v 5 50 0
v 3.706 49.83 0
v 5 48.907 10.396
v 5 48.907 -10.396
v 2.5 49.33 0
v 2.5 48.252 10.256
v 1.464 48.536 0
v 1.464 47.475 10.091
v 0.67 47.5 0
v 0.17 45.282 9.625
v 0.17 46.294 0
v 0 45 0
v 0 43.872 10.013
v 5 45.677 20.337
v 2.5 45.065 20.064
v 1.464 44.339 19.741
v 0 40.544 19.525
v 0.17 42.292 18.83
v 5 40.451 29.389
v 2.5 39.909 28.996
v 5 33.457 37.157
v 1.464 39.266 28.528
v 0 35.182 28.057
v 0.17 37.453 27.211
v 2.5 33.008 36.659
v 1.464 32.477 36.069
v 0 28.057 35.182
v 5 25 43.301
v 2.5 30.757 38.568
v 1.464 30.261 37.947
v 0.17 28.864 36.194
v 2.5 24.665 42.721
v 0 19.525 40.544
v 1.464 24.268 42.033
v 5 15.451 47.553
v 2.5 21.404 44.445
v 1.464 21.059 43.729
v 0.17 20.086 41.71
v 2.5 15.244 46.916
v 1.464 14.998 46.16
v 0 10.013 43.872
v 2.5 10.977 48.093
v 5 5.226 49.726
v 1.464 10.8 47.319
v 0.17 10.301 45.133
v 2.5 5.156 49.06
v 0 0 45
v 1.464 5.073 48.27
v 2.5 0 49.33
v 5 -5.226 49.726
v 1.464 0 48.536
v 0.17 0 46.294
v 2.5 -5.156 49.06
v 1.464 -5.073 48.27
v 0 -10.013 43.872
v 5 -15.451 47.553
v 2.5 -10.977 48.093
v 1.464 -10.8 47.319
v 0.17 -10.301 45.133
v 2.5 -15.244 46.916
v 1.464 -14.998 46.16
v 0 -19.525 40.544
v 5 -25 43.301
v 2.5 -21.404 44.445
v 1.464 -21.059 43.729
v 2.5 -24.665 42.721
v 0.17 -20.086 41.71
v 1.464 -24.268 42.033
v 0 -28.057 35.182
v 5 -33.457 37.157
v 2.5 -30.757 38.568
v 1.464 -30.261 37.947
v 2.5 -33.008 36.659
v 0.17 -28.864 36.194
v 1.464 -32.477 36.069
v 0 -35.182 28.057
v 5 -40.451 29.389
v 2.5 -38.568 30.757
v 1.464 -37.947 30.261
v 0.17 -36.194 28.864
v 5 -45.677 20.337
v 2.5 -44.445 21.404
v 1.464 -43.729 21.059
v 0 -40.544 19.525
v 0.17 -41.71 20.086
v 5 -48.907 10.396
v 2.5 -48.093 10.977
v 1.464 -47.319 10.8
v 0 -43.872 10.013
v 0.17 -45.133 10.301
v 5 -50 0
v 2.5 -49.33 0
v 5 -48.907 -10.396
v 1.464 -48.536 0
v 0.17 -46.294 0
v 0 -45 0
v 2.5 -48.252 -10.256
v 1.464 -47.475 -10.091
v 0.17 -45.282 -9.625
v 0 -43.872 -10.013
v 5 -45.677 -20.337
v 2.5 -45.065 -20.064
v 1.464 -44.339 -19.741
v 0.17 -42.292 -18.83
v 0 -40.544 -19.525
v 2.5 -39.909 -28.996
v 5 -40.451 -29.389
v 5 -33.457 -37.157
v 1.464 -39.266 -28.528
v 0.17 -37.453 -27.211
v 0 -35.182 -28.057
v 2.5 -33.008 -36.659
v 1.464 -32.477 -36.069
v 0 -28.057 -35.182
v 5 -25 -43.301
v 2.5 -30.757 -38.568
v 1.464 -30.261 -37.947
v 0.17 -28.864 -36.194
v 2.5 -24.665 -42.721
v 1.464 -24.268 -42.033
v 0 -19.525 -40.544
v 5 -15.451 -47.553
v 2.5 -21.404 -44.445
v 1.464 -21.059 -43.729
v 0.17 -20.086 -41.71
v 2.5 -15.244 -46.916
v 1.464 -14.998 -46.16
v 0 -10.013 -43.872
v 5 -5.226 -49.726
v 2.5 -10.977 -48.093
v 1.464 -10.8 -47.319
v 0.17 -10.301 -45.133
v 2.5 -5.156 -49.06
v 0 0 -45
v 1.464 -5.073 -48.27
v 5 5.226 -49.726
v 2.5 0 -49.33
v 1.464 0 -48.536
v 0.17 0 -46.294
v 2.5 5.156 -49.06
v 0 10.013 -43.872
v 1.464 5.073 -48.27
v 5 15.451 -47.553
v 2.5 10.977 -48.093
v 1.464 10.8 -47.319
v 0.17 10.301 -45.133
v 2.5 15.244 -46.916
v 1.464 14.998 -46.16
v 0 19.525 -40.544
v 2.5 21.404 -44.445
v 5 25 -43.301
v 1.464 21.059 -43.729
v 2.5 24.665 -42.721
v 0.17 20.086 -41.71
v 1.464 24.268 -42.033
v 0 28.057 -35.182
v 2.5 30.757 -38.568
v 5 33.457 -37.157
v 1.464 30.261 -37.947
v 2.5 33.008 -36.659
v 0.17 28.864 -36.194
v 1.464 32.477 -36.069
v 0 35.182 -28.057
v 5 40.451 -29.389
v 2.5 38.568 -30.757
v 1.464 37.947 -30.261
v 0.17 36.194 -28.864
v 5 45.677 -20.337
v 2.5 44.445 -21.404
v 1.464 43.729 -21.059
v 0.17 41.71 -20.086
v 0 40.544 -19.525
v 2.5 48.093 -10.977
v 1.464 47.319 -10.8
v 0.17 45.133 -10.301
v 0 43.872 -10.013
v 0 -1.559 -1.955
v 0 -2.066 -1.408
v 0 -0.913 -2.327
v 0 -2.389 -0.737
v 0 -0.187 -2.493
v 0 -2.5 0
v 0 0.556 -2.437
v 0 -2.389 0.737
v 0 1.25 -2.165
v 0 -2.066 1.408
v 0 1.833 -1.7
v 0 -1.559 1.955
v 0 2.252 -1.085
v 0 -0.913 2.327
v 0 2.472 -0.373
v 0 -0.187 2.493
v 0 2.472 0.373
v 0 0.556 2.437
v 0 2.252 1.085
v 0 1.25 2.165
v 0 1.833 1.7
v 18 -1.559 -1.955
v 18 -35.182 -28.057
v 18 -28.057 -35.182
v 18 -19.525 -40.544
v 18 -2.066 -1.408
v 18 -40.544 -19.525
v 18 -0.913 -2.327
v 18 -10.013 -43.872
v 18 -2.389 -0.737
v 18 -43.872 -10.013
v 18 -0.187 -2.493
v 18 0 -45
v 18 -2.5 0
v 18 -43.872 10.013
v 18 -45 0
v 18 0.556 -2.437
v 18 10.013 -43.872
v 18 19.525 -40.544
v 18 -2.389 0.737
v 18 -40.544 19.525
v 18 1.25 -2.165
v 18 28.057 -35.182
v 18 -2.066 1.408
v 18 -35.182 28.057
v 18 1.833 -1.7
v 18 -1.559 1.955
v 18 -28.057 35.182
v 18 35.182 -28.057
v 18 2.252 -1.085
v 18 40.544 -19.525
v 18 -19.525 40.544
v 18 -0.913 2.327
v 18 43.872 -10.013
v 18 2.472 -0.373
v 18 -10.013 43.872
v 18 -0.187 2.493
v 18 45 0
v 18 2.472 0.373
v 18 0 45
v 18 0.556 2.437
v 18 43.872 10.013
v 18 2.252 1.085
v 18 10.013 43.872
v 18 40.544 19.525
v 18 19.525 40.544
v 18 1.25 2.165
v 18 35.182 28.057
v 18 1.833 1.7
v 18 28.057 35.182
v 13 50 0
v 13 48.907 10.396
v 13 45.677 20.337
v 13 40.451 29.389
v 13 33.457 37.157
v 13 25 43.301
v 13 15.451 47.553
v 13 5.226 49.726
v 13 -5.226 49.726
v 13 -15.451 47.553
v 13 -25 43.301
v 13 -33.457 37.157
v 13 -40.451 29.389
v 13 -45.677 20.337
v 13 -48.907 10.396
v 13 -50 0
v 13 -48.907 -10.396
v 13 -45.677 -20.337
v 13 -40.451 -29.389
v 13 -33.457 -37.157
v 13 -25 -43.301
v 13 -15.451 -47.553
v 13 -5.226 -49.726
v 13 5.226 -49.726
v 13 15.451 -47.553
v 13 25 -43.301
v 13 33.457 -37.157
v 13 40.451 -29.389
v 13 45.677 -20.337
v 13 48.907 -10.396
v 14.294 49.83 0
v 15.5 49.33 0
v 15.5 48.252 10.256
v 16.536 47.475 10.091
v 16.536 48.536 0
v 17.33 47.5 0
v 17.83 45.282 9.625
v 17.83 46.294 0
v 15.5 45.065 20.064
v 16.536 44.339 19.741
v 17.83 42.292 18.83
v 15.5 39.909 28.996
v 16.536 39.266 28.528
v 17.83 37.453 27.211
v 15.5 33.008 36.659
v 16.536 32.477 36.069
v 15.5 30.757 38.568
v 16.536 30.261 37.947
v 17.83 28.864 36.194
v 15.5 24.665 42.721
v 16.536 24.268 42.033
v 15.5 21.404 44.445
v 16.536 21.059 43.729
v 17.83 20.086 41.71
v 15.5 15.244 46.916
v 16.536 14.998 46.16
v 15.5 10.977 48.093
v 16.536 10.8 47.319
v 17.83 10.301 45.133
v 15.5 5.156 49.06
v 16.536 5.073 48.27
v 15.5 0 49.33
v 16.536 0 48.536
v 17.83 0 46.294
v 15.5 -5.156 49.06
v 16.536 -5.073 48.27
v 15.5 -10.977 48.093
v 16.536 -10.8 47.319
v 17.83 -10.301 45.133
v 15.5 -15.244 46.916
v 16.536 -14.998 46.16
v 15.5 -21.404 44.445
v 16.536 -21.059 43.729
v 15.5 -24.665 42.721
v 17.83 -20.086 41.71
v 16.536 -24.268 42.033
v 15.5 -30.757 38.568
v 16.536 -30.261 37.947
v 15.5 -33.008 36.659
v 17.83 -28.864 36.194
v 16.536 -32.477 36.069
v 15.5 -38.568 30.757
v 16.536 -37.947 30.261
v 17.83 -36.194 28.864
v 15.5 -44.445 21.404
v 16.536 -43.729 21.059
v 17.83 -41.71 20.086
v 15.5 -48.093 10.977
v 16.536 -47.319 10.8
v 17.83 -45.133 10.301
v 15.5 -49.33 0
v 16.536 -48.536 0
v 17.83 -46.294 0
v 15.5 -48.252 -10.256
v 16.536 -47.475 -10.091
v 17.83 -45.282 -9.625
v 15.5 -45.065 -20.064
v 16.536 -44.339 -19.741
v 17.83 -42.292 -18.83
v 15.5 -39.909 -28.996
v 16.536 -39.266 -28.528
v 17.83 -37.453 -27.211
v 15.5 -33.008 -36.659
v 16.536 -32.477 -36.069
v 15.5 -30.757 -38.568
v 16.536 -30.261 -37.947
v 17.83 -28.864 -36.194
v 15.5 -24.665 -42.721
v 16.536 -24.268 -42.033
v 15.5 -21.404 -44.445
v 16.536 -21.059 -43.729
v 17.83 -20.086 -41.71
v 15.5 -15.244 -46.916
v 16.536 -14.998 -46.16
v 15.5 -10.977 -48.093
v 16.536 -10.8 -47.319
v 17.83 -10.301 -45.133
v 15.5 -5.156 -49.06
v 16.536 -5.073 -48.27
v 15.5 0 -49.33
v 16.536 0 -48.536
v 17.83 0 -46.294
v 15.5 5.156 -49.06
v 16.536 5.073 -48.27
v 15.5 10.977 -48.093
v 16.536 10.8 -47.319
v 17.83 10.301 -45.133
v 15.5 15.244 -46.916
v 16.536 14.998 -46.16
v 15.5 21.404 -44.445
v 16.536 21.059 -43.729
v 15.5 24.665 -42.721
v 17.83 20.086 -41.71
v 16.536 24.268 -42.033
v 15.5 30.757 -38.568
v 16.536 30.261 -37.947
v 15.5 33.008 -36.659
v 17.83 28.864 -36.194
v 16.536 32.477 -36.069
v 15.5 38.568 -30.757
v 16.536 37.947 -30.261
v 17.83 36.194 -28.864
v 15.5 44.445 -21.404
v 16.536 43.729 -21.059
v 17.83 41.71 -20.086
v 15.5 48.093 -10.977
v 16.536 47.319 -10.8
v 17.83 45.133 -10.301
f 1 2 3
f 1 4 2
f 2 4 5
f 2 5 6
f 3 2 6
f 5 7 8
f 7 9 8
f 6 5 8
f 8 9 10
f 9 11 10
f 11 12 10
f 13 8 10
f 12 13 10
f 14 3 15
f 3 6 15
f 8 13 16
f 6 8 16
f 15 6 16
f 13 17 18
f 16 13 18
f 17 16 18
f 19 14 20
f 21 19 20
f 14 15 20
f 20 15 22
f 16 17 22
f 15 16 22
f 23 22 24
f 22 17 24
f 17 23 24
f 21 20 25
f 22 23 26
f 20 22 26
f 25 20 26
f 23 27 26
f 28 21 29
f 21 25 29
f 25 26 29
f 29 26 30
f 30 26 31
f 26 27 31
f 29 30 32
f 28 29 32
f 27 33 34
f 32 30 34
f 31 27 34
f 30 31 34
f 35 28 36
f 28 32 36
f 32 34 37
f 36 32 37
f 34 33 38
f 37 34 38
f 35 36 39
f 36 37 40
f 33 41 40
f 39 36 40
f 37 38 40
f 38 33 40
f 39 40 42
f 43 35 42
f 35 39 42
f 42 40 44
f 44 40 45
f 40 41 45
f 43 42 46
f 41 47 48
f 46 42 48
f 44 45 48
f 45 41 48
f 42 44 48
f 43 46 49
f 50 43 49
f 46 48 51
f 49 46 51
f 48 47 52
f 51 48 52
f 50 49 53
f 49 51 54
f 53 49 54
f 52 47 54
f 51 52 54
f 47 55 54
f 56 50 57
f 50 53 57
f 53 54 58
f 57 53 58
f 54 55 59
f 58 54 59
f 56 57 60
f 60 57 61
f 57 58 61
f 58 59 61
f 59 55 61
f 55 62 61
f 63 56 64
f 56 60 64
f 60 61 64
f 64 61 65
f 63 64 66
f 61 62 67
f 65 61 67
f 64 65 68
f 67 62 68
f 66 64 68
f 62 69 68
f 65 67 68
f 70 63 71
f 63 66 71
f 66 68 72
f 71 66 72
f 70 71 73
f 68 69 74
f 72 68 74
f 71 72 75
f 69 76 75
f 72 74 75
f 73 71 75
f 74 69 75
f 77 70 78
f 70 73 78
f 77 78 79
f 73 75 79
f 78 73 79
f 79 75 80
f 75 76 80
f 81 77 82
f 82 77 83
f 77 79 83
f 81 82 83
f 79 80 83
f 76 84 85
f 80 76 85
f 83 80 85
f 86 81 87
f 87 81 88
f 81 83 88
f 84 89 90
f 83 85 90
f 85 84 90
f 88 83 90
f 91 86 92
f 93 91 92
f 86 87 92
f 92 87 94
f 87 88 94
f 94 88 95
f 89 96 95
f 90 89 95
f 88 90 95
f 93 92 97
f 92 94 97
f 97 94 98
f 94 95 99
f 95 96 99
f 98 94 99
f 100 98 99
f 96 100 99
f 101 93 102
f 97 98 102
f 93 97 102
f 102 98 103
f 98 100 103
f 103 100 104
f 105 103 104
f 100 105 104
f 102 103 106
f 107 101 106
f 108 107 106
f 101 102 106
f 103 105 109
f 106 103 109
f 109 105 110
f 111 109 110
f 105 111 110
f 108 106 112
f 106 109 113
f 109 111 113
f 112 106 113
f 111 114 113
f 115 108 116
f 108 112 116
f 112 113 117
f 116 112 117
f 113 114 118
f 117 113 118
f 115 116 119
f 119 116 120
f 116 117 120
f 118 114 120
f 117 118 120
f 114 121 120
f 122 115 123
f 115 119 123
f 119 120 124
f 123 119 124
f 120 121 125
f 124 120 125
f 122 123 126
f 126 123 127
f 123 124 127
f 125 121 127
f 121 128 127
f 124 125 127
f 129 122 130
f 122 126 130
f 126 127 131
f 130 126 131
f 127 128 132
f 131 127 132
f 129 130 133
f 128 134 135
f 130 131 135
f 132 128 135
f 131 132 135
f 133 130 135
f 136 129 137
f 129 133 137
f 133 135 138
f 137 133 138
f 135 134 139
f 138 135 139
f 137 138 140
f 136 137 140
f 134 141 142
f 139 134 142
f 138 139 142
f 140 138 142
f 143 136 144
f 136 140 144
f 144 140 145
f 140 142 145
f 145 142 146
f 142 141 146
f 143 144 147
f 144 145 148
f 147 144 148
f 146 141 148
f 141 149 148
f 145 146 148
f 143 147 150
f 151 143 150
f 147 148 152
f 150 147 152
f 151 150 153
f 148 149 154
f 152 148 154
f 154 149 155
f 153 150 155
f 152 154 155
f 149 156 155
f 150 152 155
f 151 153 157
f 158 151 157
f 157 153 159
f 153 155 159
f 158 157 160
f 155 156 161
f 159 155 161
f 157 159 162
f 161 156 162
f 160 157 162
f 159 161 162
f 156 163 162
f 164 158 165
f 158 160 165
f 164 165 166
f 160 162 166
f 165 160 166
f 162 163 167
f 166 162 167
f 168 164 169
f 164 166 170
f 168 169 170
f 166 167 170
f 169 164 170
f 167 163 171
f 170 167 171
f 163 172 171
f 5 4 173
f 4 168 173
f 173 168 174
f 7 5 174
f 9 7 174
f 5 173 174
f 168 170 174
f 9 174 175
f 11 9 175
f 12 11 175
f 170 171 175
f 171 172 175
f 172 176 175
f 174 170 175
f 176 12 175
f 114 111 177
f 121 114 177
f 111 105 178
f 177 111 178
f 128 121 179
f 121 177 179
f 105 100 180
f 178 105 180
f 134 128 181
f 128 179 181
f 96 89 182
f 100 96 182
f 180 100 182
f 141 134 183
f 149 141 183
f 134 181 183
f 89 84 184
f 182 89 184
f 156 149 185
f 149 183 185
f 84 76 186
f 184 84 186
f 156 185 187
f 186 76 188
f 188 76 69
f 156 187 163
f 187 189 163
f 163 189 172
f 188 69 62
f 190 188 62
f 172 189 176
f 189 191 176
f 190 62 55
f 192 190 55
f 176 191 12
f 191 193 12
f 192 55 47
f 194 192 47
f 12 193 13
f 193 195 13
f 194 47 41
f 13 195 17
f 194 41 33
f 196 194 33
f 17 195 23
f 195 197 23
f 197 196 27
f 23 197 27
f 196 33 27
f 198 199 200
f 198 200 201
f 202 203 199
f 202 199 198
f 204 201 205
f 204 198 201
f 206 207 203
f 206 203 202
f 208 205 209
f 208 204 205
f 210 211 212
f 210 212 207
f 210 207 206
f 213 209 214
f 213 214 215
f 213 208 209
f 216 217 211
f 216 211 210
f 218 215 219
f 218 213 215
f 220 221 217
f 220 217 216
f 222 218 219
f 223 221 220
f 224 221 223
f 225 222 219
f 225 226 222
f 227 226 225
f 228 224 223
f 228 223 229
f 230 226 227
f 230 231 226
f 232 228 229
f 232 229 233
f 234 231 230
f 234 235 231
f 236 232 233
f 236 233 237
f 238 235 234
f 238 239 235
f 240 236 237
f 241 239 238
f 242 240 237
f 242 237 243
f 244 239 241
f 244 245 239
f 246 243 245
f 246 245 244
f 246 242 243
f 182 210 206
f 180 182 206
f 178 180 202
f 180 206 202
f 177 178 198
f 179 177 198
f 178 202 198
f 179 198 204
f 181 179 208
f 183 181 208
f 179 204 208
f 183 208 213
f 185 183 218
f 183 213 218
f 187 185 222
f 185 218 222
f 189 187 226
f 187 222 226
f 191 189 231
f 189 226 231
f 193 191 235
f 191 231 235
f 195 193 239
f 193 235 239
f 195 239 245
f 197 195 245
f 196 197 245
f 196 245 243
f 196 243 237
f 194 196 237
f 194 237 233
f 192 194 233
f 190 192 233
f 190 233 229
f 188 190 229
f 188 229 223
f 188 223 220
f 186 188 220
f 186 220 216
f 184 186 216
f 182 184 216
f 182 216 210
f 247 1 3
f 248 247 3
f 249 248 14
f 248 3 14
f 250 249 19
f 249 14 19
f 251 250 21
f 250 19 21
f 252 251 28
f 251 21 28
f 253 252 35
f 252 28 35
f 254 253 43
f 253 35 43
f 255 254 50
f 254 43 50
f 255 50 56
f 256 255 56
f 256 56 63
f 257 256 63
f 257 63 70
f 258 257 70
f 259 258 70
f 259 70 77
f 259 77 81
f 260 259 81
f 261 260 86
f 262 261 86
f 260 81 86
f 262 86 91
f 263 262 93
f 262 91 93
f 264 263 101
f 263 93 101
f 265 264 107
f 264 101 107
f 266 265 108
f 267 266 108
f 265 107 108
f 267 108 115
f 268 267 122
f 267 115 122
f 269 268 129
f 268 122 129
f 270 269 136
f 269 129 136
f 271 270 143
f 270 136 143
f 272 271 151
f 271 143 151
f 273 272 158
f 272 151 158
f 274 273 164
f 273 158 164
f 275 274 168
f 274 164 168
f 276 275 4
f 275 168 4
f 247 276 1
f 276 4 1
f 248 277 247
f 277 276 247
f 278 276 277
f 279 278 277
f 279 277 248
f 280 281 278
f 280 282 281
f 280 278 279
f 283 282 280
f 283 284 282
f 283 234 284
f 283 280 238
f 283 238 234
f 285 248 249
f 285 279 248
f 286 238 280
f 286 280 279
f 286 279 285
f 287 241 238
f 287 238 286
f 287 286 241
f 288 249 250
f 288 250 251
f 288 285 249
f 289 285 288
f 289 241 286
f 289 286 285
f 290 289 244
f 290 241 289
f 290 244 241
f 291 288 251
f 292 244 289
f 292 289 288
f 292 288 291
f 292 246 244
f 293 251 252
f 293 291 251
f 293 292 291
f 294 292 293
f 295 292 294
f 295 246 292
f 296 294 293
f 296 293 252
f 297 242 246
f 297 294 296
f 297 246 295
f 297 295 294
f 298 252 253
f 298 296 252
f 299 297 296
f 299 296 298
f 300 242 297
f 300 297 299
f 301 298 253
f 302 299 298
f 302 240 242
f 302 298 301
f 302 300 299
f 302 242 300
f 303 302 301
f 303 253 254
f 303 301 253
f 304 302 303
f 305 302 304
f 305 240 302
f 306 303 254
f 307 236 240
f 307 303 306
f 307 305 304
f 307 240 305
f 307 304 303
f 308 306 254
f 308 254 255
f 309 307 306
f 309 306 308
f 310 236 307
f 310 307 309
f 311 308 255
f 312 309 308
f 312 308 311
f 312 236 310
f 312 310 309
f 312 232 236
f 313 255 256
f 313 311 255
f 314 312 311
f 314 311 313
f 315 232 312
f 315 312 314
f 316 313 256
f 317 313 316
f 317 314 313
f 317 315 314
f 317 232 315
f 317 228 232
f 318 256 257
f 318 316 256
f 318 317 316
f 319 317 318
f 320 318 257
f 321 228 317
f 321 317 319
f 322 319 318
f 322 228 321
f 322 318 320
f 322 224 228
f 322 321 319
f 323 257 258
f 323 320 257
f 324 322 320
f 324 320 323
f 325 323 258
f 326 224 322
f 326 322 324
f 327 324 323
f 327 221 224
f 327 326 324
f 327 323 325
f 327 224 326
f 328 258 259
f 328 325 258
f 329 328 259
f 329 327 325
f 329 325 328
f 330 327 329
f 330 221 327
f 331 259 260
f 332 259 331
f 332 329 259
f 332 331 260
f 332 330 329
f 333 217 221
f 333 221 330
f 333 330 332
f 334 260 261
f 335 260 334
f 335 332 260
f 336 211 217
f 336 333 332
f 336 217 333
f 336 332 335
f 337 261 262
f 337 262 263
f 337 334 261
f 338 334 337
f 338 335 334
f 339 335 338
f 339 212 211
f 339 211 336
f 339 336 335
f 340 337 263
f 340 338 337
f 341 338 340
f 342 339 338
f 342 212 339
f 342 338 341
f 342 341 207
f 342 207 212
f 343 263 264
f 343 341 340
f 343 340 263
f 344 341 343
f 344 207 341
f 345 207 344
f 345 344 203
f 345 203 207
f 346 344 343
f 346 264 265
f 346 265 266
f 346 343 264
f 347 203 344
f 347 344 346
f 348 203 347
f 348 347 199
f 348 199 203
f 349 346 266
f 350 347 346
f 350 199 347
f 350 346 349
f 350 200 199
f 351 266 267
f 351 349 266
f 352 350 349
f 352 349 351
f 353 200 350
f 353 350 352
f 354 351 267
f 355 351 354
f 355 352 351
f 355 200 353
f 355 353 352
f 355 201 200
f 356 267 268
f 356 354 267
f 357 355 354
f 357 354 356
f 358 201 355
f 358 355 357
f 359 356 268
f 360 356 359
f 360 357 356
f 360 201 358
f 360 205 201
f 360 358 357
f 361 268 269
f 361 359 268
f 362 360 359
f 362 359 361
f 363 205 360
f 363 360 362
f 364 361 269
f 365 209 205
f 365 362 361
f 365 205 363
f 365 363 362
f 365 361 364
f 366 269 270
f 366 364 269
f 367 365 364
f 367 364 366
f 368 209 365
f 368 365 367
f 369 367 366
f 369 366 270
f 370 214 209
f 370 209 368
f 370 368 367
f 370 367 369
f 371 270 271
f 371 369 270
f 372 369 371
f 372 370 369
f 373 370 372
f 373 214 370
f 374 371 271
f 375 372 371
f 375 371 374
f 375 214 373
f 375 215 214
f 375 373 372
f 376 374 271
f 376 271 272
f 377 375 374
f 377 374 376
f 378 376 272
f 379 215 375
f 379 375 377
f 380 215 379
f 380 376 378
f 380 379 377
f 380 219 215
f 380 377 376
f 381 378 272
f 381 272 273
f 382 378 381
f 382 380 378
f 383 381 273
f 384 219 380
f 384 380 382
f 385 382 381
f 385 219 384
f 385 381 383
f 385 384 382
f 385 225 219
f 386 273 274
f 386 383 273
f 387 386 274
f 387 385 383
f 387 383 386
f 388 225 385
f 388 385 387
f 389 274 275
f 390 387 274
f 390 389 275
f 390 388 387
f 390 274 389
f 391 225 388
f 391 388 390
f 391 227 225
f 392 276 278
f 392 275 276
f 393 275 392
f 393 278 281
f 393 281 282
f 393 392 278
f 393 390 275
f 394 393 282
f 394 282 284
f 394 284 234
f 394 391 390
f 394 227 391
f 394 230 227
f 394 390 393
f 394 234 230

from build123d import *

# Parameters (mm, degrees)
F0_R     = 50
F1_DEPTH = 18
F2_R     = 5
F3_D     = 5


with BuildPart() as f1:
    # F0 (on Right) → F1 (new body)
    with BuildSketch(Plane.YZ):
        Circle(F0_R)
    extrude(amount=F1_DEPTH)

    # F2
    f2_edges = [f1.edges().sort_by_distance(p)[0] for p in [
        (18, -50, 0),
        (0, -50, 0),
    ]]
    fillet(f2_edges, radius=F2_R)

    # F3 (through all)
    with Locations(Plane(origin=(0, 0, 0), x_dir=(0, 1, 0), z_dir=(-1, 0, 0))):
        with Locations((0, 0)):
            Hole(F3_D / 2)


solid = f1.part
